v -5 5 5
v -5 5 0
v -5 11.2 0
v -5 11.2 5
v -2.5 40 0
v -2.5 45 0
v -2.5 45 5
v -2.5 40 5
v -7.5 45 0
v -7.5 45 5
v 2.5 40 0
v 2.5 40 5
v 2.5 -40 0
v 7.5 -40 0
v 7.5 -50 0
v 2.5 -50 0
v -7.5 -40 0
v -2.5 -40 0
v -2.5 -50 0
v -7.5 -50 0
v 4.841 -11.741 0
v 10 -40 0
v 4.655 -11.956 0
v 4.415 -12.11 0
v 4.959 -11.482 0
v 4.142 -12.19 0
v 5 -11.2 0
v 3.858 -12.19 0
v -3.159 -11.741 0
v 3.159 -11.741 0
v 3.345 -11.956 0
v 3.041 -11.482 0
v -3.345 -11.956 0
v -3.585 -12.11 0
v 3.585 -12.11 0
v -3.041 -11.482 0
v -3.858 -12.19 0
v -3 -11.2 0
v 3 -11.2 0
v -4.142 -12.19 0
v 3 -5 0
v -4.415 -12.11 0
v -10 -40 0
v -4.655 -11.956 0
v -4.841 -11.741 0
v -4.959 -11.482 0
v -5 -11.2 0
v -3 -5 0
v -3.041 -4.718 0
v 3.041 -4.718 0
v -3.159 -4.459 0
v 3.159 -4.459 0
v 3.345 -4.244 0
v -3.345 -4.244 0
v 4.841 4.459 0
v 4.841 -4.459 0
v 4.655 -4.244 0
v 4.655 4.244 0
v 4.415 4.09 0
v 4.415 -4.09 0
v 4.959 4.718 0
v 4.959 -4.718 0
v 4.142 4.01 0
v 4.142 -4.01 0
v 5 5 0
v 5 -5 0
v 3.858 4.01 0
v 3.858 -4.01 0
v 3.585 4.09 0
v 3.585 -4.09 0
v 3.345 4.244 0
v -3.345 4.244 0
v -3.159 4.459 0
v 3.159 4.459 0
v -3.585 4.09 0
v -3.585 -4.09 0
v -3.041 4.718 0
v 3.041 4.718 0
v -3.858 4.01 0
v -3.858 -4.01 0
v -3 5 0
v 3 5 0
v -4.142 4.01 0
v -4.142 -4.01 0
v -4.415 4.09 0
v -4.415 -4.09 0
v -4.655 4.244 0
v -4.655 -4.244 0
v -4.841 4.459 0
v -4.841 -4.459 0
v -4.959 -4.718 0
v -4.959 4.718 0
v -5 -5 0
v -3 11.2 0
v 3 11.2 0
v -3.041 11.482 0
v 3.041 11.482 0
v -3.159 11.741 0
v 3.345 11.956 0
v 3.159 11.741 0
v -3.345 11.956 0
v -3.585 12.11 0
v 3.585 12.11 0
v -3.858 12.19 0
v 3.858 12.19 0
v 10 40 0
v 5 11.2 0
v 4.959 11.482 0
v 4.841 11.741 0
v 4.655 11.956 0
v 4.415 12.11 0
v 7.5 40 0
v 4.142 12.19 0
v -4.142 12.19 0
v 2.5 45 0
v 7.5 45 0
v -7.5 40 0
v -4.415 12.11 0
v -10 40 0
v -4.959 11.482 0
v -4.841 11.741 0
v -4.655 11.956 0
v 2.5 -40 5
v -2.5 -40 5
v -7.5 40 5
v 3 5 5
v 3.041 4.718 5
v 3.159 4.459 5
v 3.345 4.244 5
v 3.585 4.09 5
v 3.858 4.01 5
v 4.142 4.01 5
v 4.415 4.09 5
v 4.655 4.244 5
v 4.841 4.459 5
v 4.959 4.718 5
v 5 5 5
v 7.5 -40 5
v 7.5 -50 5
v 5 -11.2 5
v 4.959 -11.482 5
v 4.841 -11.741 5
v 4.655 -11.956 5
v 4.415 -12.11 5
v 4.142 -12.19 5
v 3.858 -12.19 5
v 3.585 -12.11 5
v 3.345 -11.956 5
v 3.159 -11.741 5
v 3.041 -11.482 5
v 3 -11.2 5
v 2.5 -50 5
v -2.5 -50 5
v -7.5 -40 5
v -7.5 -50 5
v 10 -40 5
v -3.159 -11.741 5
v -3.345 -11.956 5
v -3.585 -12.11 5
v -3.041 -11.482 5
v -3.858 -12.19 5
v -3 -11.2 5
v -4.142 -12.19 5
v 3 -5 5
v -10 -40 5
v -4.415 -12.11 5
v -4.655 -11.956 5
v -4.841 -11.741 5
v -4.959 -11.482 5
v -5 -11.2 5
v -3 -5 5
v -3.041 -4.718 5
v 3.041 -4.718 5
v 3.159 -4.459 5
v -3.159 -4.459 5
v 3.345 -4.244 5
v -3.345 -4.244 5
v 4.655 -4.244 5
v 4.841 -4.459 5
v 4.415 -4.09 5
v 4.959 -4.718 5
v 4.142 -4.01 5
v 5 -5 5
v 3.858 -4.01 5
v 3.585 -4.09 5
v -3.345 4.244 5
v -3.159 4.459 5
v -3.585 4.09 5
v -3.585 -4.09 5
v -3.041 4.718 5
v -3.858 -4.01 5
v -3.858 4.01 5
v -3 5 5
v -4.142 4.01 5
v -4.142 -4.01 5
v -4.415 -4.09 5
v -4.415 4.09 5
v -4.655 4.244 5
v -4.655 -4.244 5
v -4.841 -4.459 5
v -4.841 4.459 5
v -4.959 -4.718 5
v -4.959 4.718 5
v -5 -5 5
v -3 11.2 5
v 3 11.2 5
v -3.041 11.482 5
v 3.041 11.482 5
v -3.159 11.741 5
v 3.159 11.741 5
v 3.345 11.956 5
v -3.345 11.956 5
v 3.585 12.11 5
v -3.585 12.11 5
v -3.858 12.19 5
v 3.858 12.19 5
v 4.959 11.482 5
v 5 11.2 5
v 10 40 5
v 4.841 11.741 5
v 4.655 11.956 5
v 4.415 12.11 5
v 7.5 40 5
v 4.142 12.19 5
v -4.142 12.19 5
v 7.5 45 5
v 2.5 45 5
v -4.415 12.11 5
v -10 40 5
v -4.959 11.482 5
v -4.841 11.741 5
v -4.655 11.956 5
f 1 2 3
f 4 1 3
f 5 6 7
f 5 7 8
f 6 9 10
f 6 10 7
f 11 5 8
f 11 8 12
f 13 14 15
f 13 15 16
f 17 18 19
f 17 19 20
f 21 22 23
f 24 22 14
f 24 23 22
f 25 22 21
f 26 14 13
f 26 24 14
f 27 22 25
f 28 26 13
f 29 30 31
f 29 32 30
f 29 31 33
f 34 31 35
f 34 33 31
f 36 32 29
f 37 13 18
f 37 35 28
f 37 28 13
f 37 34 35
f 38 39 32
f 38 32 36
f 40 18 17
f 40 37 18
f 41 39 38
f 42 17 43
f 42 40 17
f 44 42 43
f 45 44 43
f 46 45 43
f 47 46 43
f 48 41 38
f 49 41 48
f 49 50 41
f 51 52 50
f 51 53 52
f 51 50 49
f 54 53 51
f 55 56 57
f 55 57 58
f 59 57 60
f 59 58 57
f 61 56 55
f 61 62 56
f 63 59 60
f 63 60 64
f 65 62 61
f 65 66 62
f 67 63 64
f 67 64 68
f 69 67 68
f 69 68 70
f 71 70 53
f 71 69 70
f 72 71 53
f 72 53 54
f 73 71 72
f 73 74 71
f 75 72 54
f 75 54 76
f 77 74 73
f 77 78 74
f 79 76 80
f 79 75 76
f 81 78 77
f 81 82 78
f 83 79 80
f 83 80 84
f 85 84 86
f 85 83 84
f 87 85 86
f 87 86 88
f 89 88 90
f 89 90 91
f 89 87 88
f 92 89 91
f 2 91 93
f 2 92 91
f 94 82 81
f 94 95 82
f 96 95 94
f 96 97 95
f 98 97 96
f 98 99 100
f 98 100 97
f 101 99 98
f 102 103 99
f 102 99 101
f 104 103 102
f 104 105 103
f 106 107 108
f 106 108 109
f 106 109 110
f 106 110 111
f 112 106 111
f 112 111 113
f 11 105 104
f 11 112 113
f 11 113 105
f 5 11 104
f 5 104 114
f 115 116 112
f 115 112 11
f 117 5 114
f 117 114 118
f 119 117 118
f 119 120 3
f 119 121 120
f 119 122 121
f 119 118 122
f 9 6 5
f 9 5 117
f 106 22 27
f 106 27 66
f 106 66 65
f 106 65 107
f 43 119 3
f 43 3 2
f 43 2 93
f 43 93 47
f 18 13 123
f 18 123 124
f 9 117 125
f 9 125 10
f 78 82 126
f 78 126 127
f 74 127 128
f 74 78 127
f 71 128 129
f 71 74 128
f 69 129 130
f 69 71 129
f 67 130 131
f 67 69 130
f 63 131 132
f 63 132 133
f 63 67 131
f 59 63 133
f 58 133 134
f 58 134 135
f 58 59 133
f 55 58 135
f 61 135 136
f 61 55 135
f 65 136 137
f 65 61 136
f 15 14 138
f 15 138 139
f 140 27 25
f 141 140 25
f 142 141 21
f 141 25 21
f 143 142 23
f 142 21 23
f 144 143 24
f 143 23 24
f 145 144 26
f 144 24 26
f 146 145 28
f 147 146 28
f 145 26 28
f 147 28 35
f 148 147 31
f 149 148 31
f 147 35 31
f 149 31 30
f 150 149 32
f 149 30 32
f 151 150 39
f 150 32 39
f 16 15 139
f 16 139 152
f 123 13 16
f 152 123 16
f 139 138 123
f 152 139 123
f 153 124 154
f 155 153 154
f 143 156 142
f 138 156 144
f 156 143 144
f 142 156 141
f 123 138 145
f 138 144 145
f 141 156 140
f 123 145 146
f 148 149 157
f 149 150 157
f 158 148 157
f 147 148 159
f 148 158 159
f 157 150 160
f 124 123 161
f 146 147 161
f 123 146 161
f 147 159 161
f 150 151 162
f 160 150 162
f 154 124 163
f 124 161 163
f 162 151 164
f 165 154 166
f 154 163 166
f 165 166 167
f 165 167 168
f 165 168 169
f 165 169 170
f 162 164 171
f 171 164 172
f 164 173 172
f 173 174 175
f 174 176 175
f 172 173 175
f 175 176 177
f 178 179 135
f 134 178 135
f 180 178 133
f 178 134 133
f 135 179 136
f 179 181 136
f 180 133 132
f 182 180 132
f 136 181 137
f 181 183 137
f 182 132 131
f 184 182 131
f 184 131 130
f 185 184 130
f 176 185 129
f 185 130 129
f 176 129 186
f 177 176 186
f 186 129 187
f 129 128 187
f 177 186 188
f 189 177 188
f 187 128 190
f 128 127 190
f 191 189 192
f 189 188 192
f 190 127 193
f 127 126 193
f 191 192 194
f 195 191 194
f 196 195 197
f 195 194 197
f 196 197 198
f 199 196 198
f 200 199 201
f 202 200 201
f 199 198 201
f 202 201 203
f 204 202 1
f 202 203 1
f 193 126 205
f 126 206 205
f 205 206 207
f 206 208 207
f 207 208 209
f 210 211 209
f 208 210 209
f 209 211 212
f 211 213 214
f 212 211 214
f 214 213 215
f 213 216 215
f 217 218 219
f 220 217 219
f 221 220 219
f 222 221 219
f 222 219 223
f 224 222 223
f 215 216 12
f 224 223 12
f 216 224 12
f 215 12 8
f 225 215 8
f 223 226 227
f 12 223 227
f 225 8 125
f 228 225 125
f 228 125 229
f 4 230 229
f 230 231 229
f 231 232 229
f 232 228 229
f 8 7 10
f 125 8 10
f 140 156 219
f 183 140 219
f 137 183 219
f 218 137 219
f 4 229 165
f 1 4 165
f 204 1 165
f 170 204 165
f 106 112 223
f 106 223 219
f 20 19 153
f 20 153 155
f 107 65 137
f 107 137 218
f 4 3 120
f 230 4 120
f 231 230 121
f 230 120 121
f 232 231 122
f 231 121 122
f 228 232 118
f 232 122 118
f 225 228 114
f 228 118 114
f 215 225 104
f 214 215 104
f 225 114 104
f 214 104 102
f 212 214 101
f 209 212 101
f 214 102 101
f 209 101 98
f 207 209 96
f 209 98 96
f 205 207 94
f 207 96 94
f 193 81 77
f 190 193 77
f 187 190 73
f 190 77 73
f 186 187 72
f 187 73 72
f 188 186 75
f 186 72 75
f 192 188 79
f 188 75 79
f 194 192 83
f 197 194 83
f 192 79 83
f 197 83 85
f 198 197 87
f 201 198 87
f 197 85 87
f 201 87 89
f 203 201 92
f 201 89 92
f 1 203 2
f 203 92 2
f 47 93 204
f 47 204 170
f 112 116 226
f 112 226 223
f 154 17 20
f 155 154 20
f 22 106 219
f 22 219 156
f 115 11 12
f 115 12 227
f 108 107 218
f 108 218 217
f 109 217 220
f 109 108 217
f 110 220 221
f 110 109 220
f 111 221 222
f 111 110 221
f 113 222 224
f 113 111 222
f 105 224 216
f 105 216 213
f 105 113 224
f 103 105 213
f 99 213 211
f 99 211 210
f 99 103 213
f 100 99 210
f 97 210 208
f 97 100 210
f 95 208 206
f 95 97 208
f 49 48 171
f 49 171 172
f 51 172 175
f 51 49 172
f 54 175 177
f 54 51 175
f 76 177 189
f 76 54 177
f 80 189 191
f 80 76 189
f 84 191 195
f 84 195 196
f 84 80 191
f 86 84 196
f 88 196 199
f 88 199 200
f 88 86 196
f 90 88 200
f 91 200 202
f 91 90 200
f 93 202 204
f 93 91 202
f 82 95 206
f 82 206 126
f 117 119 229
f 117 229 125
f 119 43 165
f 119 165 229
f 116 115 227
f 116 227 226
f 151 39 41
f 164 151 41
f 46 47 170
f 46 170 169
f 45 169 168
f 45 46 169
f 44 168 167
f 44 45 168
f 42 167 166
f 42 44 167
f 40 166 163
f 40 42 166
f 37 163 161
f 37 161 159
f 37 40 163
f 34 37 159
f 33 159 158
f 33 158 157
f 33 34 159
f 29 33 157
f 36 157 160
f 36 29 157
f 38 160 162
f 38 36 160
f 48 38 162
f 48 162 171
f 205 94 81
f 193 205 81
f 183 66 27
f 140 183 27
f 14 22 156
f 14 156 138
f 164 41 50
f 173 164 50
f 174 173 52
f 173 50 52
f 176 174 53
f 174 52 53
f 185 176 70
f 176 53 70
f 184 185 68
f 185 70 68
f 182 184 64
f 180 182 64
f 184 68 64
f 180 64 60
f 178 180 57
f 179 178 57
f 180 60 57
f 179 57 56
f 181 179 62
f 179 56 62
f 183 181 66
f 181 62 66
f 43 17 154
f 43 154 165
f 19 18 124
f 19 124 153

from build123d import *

# Parameters (mm, degrees)
BOSS_EXTRUDE1_DEPTH = 5


with BuildPart() as part:
    # Sketch1 → Boss-Extrude1 (new body)
    with BuildSketch(Plane.XY):
        Polygon((-7.5, 40), (-7.5, 45), (-2.5, 45), (-2.5, 40), (2.5, 40), (2.5, 45), (7.5, 45), (7.5, 40), (10, 40), (10, -40), (7.5, -40), (7.5, -50), (2.5, -50), (2.5, -45), (2.5, -40), (-2.5, -40), (-2.5, -50), (-7.5, -50), (-7.5, -45), (-7.5, -40), (-10, -40), (-10, 40), align=None)
        with BuildLine():
            Line((3, -11.2), (3, -5))
            ThreePointArc((3, -5), (4, -4), (5, -5))
            Line((5, -5), (5, -11.2))
            ThreePointArc((5, -11.2), (4, -12.2), (3, -11.2))
        make_face(mode=Mode.SUBTRACT)
        with BuildLine():
            Line((3, 11.2), (3, 5))
            ThreePointArc((3, 5), (4, 4), (5, 5))
            Line((5, 5), (5, 11.2))
            ThreePointArc((5, 11.2), (4, 12.2), (3, 11.2))
        make_face(mode=Mode.SUBTRACT)
        with BuildLine():
            Line((-3, 11.2), (-3, 5))
            ThreePointArc((-3, 5), (-4, 4), (-5, 5))
            Line((-5, 5), (-5, 11.2))
            ThreePointArc((-5, 11.2), (-4, 12.2), (-3, 11.2))
        make_face(mode=Mode.SUBTRACT)
        with BuildLine():
            Line((-3, -11.2), (-3, -5))
            ThreePointArc((-3, -5), (-4, -4), (-5, -5))
            Line((-5, -5), (-5, -11.2))
            ThreePointArc((-5, -11.2), (-4, -12.2), (-3, -11.2))
        make_face(mode=Mode.SUBTRACT)
    extrude(amount=BOSS_EXTRUDE1_DEPTH)


solid = part.part
